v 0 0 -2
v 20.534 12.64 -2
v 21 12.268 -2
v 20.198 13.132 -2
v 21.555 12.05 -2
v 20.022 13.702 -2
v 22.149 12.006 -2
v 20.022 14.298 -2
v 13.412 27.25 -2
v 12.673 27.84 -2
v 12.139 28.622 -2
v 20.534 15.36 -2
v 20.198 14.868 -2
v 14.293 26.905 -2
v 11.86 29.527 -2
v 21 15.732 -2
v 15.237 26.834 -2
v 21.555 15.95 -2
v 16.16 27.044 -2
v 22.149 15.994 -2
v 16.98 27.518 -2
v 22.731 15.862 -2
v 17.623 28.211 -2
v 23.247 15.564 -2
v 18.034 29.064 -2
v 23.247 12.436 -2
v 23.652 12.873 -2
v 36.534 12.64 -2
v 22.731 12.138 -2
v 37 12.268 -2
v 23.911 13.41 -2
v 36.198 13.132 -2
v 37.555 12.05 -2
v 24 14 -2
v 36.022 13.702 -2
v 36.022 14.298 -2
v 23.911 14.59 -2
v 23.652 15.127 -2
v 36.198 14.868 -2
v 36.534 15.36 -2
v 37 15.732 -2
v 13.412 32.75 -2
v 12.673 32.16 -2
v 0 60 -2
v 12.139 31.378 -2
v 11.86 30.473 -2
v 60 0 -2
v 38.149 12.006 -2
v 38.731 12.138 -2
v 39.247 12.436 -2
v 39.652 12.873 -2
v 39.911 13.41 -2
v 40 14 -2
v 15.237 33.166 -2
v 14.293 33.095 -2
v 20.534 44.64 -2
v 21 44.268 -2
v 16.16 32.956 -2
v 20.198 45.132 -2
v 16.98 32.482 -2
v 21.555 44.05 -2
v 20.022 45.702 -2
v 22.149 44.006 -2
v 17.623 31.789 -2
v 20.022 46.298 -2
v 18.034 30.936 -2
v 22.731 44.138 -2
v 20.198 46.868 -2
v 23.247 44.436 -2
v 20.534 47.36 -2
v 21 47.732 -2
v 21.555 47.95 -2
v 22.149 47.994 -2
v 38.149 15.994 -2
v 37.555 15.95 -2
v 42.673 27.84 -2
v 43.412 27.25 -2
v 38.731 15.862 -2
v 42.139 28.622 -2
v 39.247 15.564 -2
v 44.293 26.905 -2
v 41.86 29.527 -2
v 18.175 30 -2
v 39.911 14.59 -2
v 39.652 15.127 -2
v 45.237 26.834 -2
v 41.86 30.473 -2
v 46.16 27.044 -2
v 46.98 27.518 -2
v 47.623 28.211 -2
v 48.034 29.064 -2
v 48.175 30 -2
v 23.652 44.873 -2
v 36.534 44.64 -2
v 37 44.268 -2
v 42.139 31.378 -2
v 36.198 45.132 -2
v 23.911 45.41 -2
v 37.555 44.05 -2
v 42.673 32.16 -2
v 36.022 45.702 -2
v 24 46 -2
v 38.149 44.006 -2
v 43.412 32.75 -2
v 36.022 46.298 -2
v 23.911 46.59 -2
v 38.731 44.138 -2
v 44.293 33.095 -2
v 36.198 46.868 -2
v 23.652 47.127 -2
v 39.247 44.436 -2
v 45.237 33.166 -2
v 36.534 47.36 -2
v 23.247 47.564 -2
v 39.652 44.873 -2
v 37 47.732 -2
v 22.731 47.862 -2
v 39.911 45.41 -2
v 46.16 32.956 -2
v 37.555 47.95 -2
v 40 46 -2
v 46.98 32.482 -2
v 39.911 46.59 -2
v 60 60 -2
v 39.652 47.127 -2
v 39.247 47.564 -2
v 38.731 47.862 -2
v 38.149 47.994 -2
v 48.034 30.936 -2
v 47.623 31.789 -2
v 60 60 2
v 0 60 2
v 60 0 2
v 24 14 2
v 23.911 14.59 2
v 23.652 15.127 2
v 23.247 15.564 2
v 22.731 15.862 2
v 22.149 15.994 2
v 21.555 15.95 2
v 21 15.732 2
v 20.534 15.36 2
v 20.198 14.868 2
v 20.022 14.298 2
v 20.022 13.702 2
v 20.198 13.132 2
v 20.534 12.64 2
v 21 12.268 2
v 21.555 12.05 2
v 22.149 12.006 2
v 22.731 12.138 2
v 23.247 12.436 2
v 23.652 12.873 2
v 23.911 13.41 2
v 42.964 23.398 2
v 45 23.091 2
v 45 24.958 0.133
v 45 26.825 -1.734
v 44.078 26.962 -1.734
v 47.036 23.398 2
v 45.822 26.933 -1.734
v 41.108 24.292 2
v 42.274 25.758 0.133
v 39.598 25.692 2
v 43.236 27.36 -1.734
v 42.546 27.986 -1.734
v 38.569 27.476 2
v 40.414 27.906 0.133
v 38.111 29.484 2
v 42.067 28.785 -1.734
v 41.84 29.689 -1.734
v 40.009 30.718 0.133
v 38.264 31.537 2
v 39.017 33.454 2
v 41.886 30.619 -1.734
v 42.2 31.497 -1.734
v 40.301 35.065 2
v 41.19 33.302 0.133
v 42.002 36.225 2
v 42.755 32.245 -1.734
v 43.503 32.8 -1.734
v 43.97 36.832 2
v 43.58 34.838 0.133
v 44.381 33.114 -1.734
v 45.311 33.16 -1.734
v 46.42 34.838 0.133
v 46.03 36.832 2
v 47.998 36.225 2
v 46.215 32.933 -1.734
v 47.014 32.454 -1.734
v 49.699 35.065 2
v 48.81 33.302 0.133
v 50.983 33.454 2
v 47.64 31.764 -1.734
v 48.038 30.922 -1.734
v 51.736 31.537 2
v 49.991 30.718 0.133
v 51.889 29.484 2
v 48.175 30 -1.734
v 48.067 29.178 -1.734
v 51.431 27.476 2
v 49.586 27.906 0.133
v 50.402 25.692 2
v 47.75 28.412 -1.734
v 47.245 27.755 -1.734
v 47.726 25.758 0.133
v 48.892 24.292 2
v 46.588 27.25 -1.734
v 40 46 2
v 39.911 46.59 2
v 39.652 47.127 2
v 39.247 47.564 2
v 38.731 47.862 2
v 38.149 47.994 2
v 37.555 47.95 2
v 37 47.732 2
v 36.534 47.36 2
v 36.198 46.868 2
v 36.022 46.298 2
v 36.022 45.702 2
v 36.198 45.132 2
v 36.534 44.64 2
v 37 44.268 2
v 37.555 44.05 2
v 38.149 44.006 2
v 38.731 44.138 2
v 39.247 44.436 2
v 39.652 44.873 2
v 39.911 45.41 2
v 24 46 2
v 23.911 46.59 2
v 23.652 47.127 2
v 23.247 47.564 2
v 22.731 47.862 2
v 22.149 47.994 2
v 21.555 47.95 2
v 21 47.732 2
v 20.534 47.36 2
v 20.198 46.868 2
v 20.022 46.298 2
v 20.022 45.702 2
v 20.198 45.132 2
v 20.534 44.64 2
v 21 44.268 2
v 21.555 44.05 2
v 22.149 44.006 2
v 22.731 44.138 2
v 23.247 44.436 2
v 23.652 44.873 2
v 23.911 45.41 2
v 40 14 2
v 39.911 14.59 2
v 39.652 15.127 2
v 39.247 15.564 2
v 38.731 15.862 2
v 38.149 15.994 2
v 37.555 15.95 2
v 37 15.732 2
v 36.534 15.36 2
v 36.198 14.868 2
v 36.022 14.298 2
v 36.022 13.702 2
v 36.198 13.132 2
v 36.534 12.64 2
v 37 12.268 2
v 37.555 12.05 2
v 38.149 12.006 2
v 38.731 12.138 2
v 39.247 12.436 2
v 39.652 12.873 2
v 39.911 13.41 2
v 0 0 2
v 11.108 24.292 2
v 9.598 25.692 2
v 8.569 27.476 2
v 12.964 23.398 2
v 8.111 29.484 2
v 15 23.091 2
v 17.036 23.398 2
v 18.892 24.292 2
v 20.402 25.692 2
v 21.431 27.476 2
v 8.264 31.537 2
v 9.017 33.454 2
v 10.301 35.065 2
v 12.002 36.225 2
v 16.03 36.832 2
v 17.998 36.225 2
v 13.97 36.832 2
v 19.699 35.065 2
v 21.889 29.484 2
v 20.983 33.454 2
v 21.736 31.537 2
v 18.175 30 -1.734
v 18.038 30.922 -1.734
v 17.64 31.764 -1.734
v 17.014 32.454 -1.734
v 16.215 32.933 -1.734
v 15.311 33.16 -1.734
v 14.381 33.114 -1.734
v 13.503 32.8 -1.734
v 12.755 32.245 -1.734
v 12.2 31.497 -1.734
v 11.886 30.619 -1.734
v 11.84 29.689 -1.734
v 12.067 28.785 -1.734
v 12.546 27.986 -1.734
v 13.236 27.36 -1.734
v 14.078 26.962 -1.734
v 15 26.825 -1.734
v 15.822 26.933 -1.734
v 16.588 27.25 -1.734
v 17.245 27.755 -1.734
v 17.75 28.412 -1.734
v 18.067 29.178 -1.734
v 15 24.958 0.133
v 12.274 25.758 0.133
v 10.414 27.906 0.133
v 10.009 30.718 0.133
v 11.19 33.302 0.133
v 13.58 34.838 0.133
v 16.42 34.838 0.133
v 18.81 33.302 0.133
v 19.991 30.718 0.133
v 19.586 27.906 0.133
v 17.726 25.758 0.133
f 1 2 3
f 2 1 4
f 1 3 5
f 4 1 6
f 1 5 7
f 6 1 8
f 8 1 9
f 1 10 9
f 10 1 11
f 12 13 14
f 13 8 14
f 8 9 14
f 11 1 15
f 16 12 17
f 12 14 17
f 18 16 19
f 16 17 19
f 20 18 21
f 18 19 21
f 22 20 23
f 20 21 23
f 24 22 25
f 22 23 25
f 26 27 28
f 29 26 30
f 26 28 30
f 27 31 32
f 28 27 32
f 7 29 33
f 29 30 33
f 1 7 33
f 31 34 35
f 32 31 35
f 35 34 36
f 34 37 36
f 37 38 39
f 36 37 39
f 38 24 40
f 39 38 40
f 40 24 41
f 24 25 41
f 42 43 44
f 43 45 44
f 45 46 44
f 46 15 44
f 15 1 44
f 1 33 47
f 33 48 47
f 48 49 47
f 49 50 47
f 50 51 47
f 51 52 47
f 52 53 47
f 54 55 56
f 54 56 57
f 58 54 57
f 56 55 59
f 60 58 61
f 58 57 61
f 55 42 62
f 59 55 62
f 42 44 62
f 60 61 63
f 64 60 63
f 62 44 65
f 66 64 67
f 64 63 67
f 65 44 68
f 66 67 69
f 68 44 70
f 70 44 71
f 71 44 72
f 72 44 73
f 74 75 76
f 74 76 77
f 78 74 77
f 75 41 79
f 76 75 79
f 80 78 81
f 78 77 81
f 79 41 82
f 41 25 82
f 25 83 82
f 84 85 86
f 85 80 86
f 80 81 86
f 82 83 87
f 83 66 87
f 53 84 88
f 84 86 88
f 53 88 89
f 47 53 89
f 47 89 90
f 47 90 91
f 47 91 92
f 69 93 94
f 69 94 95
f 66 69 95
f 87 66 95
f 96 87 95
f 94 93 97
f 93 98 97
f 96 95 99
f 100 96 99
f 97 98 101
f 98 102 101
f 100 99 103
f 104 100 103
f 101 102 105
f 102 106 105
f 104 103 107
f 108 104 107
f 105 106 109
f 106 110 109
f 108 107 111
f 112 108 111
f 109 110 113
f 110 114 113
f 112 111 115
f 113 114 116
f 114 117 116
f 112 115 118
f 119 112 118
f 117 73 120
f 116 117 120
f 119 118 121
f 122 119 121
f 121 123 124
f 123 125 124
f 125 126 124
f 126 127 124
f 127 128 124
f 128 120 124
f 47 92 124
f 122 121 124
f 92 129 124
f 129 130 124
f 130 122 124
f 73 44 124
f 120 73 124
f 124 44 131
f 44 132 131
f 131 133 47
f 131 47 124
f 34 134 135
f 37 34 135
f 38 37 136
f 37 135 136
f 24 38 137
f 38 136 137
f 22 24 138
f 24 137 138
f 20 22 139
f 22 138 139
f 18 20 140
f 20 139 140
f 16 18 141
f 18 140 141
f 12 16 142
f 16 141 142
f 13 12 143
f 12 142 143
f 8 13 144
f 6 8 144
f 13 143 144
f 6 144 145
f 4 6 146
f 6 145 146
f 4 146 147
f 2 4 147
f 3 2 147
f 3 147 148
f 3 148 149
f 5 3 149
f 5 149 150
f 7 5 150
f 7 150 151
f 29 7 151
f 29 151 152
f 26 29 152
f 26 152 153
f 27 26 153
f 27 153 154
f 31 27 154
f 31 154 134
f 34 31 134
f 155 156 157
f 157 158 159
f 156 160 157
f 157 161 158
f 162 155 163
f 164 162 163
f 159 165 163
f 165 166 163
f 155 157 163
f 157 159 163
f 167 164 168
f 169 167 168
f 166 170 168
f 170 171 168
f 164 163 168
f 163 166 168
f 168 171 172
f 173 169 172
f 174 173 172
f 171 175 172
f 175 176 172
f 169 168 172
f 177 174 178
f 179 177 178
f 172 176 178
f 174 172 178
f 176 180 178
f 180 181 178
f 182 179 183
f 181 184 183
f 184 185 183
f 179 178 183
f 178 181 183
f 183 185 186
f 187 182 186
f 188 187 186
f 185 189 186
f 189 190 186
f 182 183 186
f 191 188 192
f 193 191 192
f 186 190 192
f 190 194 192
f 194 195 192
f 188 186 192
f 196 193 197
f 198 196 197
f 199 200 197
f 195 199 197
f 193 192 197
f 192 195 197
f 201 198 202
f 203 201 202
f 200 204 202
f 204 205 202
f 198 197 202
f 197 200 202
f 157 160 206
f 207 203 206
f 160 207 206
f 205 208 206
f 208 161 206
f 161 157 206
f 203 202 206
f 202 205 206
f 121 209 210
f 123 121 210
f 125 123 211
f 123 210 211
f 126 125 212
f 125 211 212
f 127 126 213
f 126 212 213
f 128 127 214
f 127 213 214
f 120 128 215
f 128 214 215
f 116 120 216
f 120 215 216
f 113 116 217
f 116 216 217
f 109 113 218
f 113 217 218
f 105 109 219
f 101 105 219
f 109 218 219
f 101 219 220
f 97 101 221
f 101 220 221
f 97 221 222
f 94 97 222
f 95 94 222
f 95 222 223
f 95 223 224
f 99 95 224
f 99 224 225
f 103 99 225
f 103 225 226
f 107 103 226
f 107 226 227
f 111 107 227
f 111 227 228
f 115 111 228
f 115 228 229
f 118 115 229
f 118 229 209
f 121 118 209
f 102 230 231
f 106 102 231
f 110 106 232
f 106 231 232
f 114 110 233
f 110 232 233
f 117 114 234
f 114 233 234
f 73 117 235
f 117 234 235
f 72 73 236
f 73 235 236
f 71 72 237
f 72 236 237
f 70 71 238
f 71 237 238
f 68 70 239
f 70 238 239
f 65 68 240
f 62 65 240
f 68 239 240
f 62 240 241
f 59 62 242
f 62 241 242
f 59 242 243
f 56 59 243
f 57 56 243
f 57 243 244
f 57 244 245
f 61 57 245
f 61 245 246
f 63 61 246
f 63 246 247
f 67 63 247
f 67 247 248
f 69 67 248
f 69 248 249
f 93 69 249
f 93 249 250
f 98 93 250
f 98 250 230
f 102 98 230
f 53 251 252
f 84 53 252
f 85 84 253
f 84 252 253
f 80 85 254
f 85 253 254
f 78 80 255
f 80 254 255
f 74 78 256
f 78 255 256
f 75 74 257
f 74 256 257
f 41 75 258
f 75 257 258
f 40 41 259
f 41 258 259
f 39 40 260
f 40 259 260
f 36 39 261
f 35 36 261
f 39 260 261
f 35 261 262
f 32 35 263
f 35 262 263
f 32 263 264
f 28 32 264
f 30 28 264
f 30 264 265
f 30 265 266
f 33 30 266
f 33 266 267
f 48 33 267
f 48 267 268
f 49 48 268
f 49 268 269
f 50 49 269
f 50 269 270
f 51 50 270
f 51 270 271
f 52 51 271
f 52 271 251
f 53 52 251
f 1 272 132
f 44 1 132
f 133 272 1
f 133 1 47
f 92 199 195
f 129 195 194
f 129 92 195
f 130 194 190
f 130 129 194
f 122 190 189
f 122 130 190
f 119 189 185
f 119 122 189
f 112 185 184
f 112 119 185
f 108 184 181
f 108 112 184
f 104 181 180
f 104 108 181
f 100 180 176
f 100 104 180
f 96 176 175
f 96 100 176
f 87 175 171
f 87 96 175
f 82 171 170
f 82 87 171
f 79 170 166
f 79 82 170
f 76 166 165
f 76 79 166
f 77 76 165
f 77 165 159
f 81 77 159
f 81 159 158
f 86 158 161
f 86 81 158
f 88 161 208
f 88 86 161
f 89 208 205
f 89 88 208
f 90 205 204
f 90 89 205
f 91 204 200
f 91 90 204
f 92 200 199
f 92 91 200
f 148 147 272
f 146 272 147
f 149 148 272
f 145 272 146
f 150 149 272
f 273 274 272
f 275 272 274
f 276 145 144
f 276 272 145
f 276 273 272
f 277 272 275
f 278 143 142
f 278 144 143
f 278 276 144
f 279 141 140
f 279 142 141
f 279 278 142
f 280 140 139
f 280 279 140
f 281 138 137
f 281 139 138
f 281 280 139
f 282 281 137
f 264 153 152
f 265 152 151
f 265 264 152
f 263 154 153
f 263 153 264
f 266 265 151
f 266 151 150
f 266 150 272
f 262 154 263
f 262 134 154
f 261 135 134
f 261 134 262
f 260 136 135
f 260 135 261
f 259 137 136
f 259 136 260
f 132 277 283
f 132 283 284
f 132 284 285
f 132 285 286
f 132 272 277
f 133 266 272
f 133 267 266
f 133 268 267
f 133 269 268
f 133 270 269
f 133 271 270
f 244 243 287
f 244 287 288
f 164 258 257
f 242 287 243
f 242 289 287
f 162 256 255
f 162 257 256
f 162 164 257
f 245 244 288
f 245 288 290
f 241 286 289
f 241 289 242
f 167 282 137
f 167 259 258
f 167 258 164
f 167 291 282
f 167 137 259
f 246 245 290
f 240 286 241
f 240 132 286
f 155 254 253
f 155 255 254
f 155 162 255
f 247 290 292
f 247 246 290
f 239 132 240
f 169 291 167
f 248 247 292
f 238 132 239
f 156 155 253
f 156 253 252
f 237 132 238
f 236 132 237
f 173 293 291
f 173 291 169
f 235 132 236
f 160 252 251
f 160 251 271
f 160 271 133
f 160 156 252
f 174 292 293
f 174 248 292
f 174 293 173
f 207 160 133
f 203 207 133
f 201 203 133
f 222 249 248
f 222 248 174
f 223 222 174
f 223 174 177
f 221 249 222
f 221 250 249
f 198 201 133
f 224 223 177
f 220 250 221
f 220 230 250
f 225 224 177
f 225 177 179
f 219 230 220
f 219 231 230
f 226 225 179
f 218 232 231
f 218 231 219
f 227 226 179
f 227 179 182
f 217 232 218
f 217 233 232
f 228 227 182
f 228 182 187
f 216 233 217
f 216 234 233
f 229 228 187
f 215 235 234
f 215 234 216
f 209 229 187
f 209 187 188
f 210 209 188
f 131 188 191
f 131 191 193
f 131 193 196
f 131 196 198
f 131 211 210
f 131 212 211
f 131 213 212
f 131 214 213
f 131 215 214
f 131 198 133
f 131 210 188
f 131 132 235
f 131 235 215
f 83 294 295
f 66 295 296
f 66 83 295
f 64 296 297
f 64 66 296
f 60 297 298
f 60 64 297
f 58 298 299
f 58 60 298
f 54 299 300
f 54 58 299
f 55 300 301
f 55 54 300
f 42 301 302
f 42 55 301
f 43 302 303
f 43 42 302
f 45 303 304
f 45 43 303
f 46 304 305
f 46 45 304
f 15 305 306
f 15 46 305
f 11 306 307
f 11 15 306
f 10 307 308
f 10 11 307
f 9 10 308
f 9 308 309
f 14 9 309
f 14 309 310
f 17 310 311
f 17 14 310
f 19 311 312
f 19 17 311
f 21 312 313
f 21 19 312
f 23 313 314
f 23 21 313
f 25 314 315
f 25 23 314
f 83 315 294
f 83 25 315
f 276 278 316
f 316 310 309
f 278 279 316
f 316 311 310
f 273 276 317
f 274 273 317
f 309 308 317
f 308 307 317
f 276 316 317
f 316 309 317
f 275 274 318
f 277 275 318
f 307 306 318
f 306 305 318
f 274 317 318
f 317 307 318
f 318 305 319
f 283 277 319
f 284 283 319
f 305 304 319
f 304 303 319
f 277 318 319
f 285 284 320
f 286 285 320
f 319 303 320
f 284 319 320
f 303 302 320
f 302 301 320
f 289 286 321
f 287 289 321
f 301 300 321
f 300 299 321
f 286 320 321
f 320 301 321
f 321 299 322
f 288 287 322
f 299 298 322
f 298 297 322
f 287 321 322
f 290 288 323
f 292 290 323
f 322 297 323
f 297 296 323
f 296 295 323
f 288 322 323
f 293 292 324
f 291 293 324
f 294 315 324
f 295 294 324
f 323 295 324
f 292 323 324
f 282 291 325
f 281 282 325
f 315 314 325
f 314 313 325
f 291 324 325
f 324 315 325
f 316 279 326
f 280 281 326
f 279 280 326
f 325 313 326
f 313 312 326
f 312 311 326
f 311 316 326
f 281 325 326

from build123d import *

# Parameters (mm, degrees)
SKETCH1_W           = 60
SKETCH1_H           = 60
SKETCH1_R           = 3.175
BOSS_EXTRUDE1_DEPTH = 2
SKETCH3_R           = 2
CUT_EXTRUDE2_DEPTH  = 85.947042326


with BuildPart() as part:
    # Sketch1 → Boss-Extrude1 (new, symmetric)
    with BuildSketch(Plane.XY):
        with Locations((30, 30)):
            Rectangle(SKETCH1_W, SKETCH1_H)
        with Locations((15, 30)):
            Circle(SKETCH1_R, mode=Mode.SUBTRACT)
        with Locations((45, 30)):
            Circle(SKETCH1_R, mode=Mode.SUBTRACT)
    extrude(amount=BOSS_EXTRUDE1_DEPTH, both=True)

    # Cut-Extrude1 cone 1 section (through the dimple's axis) → Cut-Extrude1 (revolve, cut)
    with BuildSketch(Plane(origin=(15, 30, 2), x_dir=(0, -1, 0), z_dir=(1, 0, 0))):
        Polygon((0, 0), (6.9088, 0), (0, 6.9088), align=None)
    revolve(axis=Axis((15, 30, 2), (0, 0, -1)), mode=Mode.SUBTRACT)

    # Cut-Extrude1 cone 2 section (through the dimple's axis) → Cut-Extrude1 cone 2 (revolve, cut)
    with BuildSketch(Plane(origin=(45, 30, 2), x_dir=(0, -1, 0), z_dir=(1, 0, 0))):
        Polygon((0, 0), (6.9088, 0), (0, 6.9088), align=None)
    revolve(axis=Axis((45, 30, 2), (0, 0, -1)), mode=Mode.SUBTRACT)

    # Sketch3 → Cut-Extrude2 (cut, through all)
    with BuildSketch(Plane.XY.offset(2)):
        with Locations((22, 14)):
            Circle(SKETCH3_R)
        with Locations((38, 14)):
            Circle(SKETCH3_R)
        with Locations((38, 46)):
            Circle(SKETCH3_R)
        with Locations((22, 46)):
            Circle(SKETCH3_R)
    extrude(amount=-CUT_EXTRUDE2_DEPTH, mode=Mode.SUBTRACT)


solid = part.part
